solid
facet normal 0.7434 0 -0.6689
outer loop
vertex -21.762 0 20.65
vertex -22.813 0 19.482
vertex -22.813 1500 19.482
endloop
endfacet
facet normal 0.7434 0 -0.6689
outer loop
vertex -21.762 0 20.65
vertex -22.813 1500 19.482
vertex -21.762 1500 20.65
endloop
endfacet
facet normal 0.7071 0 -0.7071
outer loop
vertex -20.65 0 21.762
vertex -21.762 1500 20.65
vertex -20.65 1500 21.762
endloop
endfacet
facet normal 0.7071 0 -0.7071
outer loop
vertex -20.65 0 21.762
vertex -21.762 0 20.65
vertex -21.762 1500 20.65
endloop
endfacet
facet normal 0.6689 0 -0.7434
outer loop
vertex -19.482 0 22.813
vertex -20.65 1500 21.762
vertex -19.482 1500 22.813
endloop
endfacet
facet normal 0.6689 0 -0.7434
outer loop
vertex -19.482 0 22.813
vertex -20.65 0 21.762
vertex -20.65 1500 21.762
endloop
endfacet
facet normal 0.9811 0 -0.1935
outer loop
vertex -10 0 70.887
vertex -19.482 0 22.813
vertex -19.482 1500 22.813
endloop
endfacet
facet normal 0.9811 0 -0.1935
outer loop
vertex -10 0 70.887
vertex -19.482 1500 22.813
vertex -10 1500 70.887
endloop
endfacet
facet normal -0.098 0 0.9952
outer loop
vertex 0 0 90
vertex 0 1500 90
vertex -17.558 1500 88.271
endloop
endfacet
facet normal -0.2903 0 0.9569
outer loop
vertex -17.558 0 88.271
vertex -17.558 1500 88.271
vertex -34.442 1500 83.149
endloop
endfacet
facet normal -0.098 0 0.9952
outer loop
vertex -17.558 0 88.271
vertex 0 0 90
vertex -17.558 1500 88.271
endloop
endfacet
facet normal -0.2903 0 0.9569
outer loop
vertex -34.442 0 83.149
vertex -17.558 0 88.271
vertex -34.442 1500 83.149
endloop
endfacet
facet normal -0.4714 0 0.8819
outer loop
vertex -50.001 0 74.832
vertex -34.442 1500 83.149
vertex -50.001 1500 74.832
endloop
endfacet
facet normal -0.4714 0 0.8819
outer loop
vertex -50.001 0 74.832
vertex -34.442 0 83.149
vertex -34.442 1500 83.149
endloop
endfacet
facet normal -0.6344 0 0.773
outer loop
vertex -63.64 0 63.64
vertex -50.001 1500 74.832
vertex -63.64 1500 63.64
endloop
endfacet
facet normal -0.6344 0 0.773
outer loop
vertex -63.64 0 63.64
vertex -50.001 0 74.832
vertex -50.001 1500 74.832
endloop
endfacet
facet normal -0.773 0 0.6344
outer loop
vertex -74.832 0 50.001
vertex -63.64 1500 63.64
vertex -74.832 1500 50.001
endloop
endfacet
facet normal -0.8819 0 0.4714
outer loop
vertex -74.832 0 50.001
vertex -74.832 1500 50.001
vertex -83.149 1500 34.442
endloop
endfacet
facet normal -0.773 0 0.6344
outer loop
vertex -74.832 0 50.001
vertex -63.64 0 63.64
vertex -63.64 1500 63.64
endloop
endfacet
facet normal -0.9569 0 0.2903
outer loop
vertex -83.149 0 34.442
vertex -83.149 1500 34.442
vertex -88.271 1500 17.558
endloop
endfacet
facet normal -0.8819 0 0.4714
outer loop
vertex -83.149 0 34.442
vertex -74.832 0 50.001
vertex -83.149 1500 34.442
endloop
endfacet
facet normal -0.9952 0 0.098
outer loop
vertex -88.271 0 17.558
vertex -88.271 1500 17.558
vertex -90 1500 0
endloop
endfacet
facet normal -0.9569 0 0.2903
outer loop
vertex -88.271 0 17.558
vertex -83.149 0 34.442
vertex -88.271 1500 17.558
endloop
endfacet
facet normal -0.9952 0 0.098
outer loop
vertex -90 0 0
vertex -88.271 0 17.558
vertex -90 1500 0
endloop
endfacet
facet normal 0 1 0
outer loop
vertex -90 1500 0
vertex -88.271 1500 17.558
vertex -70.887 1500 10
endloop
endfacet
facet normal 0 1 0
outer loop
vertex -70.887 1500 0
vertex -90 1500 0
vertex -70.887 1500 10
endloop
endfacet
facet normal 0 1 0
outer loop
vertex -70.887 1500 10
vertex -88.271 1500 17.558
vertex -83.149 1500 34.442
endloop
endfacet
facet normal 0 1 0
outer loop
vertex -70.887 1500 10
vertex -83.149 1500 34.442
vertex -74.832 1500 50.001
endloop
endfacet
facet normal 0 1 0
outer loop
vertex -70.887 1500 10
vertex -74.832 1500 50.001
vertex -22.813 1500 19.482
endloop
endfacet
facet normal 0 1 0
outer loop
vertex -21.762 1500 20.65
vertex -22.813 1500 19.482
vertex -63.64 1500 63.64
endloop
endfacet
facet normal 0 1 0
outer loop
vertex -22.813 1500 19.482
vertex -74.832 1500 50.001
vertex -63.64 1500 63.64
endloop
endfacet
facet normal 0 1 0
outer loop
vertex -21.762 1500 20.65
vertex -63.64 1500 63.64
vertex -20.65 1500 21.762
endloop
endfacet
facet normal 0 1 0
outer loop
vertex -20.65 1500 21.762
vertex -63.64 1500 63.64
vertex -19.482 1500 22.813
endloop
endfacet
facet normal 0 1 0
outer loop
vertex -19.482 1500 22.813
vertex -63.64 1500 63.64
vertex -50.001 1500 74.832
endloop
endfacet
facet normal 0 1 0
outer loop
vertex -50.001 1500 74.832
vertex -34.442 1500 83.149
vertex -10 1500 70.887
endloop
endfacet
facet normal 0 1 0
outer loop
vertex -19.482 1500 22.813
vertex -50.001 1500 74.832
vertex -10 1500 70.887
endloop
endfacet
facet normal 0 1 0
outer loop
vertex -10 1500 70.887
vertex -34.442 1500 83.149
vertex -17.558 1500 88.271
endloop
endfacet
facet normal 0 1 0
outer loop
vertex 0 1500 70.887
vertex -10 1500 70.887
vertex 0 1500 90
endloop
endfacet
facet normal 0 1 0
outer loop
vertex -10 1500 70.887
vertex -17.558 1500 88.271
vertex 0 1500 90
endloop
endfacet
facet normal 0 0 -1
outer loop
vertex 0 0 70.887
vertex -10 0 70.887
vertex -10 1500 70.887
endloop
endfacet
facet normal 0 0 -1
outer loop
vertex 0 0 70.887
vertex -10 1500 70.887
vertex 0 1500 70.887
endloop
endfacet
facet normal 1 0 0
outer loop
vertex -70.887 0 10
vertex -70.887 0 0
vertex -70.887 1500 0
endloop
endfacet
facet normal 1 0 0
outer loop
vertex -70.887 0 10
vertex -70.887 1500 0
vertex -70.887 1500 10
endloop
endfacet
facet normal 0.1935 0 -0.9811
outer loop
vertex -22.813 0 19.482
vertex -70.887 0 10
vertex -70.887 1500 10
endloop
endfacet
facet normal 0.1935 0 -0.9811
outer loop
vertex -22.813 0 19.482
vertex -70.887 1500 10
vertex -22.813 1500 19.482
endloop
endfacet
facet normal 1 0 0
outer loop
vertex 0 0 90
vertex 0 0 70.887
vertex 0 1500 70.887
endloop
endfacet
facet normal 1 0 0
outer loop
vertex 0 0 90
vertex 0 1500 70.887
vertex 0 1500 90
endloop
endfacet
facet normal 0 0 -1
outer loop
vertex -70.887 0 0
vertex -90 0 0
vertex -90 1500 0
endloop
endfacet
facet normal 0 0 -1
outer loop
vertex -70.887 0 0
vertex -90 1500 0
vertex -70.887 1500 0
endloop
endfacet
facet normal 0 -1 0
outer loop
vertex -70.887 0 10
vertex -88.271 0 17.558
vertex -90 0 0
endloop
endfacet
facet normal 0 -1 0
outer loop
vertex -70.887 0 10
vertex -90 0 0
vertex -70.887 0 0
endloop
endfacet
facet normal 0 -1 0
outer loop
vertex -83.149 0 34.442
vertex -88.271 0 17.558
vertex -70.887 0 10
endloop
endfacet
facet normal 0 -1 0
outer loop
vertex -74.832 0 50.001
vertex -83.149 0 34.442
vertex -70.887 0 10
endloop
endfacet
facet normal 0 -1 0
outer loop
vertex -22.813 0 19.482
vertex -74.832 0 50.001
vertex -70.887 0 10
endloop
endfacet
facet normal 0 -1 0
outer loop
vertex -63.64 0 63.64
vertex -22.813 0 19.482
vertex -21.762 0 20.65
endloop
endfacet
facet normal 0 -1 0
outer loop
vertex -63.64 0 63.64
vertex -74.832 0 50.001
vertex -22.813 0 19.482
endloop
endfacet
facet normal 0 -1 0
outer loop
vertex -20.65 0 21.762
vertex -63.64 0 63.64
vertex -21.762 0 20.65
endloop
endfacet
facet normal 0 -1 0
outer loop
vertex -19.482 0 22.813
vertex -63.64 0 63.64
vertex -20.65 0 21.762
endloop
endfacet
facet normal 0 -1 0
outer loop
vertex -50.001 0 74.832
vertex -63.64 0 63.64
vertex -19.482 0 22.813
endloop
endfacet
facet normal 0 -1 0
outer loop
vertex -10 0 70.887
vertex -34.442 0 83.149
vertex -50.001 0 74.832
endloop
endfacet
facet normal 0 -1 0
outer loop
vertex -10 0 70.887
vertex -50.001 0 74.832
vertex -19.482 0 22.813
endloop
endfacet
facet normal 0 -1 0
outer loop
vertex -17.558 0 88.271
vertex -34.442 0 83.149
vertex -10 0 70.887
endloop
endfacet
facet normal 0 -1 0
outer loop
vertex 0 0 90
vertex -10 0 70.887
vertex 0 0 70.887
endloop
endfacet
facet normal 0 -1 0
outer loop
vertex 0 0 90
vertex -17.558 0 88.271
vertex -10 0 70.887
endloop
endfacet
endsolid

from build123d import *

# Parameters (mm, degrees)
F1_DEPTH = 1500


with BuildPart() as f1:
    # F0 (on Front) → F1 (new body)
    with BuildSketch(Plane.XZ):
        with BuildLine():
            Line((0, 70.887234), (0, 90))
            ThreePointArc((0, 90), (-63.63961, 63.63961), (-90, 0))
            Line((-90, 0), (-70.887234, 0))
            Line((-70.887234, 0), (-70.887234, 10))
            Line((-70.887234, 10), (-22.813418, 19.481991))
            ThreePointArc((-22.813418, 19.481991), (-21.213203, 21.213203), (-19.481991, 22.813418))
            Line((-19.481991, 22.813418), (-10, 70.887234))
            Line((-10, 70.887234), (0, 70.887234))
        make_face()
    extrude(amount=-F1_DEPTH)


solid = f1.part
